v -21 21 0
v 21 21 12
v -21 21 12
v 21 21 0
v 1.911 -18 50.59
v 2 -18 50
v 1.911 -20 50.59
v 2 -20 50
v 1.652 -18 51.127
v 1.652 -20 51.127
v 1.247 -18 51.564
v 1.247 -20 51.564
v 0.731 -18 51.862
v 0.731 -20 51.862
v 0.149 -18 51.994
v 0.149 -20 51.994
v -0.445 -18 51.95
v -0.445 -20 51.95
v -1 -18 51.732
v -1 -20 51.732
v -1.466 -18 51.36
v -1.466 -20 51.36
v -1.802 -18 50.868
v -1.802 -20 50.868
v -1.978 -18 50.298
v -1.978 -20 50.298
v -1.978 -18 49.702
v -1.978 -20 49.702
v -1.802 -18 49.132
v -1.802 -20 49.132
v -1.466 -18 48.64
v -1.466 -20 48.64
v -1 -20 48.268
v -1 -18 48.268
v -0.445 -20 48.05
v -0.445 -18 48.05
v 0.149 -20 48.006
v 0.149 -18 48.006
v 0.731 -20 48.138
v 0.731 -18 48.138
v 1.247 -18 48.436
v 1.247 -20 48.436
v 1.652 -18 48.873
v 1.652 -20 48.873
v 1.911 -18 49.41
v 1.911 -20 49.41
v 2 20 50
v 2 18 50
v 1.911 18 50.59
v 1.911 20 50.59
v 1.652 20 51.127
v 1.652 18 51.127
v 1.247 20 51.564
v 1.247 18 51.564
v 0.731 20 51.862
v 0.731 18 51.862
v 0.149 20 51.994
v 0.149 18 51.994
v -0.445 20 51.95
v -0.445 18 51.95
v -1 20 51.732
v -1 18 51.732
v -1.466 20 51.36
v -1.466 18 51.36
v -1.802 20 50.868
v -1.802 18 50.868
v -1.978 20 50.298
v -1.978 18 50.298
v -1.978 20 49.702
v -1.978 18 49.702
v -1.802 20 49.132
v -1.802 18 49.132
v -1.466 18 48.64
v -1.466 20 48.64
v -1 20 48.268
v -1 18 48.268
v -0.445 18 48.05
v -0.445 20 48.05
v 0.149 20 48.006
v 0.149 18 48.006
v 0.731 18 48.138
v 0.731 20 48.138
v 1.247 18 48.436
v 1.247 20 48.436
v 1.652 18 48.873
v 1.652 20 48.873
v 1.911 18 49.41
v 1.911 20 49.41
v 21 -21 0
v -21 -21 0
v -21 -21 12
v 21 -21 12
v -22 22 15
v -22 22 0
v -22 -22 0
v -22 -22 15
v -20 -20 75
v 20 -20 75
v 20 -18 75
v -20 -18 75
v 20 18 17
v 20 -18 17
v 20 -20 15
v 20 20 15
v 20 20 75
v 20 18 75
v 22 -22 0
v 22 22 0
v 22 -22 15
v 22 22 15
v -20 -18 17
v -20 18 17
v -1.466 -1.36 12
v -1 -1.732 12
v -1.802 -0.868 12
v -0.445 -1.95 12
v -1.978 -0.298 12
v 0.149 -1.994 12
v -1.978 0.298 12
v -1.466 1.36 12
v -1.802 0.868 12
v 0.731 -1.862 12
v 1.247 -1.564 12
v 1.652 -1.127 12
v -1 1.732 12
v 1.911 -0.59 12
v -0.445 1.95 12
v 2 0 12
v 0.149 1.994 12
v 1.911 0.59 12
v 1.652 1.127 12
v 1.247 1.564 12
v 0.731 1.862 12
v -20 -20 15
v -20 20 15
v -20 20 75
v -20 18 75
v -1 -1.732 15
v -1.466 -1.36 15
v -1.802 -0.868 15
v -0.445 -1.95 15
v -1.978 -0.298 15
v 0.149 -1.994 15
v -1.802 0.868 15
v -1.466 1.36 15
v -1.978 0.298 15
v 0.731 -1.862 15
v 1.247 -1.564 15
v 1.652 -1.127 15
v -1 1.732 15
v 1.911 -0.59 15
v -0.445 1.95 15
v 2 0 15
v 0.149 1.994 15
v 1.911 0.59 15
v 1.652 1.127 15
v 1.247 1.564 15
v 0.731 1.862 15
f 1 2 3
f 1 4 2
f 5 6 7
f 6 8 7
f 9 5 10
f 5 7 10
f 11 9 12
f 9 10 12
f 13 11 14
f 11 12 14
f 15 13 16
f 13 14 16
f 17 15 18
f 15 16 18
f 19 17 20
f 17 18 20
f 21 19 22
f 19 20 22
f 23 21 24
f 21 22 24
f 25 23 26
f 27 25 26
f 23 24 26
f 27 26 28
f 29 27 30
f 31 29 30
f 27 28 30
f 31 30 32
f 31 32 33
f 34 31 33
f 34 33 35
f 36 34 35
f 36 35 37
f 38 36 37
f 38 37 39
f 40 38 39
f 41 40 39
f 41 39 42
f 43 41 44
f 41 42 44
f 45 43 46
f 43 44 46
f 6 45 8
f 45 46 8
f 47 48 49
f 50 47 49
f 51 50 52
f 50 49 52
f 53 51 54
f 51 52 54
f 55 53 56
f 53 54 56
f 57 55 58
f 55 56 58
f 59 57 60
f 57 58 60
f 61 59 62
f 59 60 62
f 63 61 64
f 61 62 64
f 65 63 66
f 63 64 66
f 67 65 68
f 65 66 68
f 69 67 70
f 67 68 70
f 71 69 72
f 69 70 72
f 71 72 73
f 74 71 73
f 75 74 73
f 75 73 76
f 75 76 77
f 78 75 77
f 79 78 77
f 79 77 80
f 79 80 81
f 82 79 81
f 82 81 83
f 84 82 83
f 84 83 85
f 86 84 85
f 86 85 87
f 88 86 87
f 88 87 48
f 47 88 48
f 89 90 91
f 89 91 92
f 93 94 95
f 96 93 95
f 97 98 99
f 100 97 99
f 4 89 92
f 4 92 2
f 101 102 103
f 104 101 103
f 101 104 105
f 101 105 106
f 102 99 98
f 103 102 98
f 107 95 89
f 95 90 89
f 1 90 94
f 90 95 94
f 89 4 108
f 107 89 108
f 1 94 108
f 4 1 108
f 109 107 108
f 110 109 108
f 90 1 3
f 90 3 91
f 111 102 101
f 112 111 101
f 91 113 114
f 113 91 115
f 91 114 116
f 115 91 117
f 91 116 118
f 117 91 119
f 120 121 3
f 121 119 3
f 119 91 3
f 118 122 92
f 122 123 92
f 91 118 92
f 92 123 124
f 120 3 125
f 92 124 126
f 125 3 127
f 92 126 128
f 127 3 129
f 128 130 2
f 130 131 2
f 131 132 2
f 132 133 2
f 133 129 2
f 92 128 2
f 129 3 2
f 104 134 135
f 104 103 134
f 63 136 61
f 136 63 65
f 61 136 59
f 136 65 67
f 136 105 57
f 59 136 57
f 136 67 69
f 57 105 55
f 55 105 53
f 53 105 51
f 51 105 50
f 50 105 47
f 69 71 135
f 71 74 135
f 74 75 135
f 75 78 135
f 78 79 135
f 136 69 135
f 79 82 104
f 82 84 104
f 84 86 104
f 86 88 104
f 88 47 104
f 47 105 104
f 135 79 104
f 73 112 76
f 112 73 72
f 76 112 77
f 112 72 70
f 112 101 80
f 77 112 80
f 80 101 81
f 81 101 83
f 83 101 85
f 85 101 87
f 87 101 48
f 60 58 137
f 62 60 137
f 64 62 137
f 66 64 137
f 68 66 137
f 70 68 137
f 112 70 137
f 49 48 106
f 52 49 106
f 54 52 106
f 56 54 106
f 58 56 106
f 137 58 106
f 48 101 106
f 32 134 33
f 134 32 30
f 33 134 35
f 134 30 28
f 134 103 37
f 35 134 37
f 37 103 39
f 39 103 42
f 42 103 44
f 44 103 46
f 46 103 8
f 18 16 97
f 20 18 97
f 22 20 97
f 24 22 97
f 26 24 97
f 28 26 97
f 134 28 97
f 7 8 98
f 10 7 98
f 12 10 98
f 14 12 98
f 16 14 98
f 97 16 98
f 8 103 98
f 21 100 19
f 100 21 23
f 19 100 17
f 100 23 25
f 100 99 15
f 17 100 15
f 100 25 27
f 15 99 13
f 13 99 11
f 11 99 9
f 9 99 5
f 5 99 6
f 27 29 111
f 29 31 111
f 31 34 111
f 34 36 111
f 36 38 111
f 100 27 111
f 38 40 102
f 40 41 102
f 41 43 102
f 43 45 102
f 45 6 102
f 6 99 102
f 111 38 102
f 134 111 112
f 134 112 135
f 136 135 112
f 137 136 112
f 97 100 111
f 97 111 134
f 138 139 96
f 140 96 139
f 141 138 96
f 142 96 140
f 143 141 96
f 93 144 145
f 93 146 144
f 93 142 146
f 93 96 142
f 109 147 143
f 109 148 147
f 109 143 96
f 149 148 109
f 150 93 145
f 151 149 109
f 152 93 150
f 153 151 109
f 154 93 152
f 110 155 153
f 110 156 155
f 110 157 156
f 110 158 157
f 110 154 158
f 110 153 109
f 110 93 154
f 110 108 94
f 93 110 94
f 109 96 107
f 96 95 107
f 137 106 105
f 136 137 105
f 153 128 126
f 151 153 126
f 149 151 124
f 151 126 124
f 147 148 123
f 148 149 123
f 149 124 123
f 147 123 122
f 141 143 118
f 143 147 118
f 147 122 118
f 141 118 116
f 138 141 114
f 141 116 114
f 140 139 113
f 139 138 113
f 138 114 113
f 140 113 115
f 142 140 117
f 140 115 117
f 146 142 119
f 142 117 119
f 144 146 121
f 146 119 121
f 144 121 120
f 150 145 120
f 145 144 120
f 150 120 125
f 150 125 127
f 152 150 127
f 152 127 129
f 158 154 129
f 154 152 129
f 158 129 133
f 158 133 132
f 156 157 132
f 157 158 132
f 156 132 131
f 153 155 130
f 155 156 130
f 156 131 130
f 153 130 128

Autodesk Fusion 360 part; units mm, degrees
sketch "Sketch1" plane through (0, 0, 0) normal (0, 0, 1) x (1, 0, 0) in component "Base housing"
  line L0 (21, 21) -> (-21, 21)
  line L1 (-21, 21) -> (-21, -21)
  line L2 (-21, -21) -> (21, -21)
  line L3 (21, -21) -> (21, 21)
  line L4 (21, 21) -> (-21, -21) construction
  line L5 (-21, 21) -> (21, -21) construction
  line L6 (22, 22) -> (-22, 22)
  line L7 (-22, 22) -> (-22, -22)
  line L8 (-22, -22) -> (22, -22)
  line L9 (22, -22) -> (22, 22)
  line L10 (22, 22) -> (-22, -22) construction
  line L11 (-22, 22) -> (22, -22) construction
  circle A0 centre (0, 0) radius 2
  dimension "d1" = 42
  dimension "d2" = 42
  dimension "d3" = 44
  dimension "d4" = 44
  dimension "d5" = 4
extrude "Extrude1" add sketch "Sketch1" along normal blind 15 contours L0 L1 L2 L3 | L6 L7 L8 L9 makes body 1 in component "Base housing"
extrude "Extrude2" cut sketch "Sketch1" along normal blind 12 contours L0 L1 L2 L3 bodies 1 in component "Base housing"
sketch "Sketch1 (2)" plane through (-22, 0, 0) normal (-1, 0, 0) x (0, -1, 0) in component "Tilt mount"
  line L0 (-22, 0) -> (22, 0)
  line L1 (22, 0) -> (22, 15)
  line L2 (22, 15) -> (-22, 15)
  line L3 (-22, 15) -> (-22, 0)
  line L4 (-20, 15) -> (20, 15)
  line L5 (20, 15) -> (20, 75)
  line L6 (20, 75) -> (-20, 75)
  line L7 (-20, 75) -> (-20, 15)
  line L8 (-18, 75) -> (18, 75)
  line L9 (18, 75) -> (18, 17)
  line L10 (18, 17) -> (-18, 17)
  line L11 (-18, 17) -> (-18, 75)
  dimension "d10" = 40
  dimension "d11" = 60
  dimension "d12" = 36
  dimension "d13" = 58
extrude "Extrude1'" add sketch "Sketch1 (2)" along normal mid plane 40 from surface at -22 separate body contours L2 L4 L5 L6 L7 L9 L10 L11 makes body 2 in component "Tilt mount"
sketch "Sketch2" plane through (0, -22, 0) normal (0, -1, 0) x (1, 0, 0) in component "Tilt mount"
  line L0 (-22, 0) -> (22, 0)
  line L1 (22, 0) -> (22, 15)
  line L2 (22, 15) -> (-22, 15)
  line L3 (-22, 15) -> (-22, 0)
  line L4 (0, 75) -> (0, 70) construction
  line L5 (0, 70) -> (0, 50) construction
  circle A0 centre (0, 50) radius 2
  dimension "d17" = 5
  dimension "d18" = 20
  dimension "d19" = 4
extrude "Extrude2'" cut sketch "Sketch2" against normal blind 44 contours A0 bodies 2 in component "Tilt mount"
component "Base housing" placed x (1, 0, 0) y (0, 1, 0) z (0, 0, 1) at (0, 0, 0)
component "Tilt mount" placed x (1, 0, 0) y (0, 1, 0) z (0, 0, 1) at (0, 0, 0)
